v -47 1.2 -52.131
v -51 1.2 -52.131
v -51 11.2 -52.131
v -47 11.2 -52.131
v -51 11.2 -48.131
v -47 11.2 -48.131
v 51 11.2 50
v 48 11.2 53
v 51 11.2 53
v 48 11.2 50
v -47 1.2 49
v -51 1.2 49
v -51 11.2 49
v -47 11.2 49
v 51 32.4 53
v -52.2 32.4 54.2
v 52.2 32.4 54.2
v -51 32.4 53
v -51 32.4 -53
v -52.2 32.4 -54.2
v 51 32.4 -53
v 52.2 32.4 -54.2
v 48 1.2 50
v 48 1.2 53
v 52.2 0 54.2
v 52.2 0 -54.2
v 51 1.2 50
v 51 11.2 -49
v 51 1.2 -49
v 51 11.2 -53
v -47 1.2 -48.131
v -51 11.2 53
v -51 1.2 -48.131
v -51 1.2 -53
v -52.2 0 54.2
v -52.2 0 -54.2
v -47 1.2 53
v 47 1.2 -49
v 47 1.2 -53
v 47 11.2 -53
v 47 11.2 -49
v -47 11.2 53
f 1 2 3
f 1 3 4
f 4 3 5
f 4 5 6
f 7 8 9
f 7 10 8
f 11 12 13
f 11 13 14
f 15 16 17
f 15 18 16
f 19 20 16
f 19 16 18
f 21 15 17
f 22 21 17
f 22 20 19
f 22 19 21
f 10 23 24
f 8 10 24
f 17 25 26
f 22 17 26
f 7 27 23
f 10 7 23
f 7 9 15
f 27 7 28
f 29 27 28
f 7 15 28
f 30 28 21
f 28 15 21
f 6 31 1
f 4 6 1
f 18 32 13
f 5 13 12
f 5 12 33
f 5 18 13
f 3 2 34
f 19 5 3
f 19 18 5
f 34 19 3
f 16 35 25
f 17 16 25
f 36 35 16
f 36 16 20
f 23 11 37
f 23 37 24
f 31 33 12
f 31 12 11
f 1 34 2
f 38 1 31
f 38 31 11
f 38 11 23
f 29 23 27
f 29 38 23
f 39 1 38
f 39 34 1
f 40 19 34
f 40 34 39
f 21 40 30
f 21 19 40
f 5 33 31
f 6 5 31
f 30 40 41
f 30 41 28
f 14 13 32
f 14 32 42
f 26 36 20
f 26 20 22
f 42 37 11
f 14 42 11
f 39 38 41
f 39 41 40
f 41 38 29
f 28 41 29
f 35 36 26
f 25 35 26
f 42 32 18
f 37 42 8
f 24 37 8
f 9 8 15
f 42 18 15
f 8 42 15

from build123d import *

# Parameters (mm, degrees)
SKETCH_1_W          = 104.4
SKETCH_1_H          = 108.4
EXTRUDE_1_DEPTH     = 32.4
SKETCH_2_W          = 102
SKETCH_2_H          = 106
CUT_EXTRUDE_1_DEPTH = 31.2
EXTRUDE_2_DEPTH     = 10
SKETCH_6_W          = 4
SKETCH_6_H          = 4
EXTRUDE_3_DEPTH     = 10
SKETCH_7_W          = 4
SKETCH_7_H          = 4
EXTRUDE_4_DEPTH     = 10
SKETCH_10_W         = 4
SKETCH_10_H         = 4
EXTRUDE_5_DEPTH     = 10


with BuildPart() as part:
    # 草图1 → 凸台-拉伸1 (new body)
    with BuildSketch(Plane(origin=(0, 0, 0), x_dir=(1, 0, 0), z_dir=(0, 1, 0))):
        Rectangle(SKETCH_1_W, SKETCH_1_H)
    extrude(amount=EXTRUDE_1_DEPTH)

    # 草图2 → 切除-拉伸1 (cut)
    with BuildSketch(Plane(origin=(0, 32.4, 0), x_dir=(1, 0, 0), z_dir=(0, 1, 0))):
        Rectangle(SKETCH_2_W, SKETCH_2_H)
    extrude(amount=-CUT_EXTRUDE_1_DEPTH, mode=Mode.SUBTRACT)

    # 草图3 → 凸台-拉伸2 (add)
    with BuildSketch(Plane(origin=(0, 1.2, 0), x_dir=(1, 0, 0), z_dir=(0, 1, 0))):
        Polygon((48, -53), (51, -53), (51, -52.54057914), (51, -50), (48, -50), align=None)
    extrude(amount=EXTRUDE_2_DEPTH)

    # 草图6 → 凸台-拉伸3 (add)
    with BuildSketch(Plane(origin=(0, 1.2, 0), x_dir=(1, 0, 0), z_dir=(0, 1, 0))):
        with Locations((49, 51)):
            Rectangle(SKETCH_6_W, SKETCH_6_H)
    extrude(amount=EXTRUDE_3_DEPTH)

    # 草图7 → 凸台-拉伸4 (add)
    with BuildSketch(Plane(origin=(0, 1.2, 0), x_dir=(1, 0, 0), z_dir=(0, 1, 0))):
        with Locations((-49, -51)):
            Rectangle(SKETCH_7_W, SKETCH_7_H)
    extrude(amount=EXTRUDE_4_DEPTH)

    # 草图10 → 凸台-拉伸5 (add)
    with BuildSketch(Plane(origin=(0, 1.2, 0), x_dir=(1, 0, 0), z_dir=(0, 1, 0))):
        with Locations((-49, 50.130572063)):
            Rectangle(SKETCH_10_W, SKETCH_10_H)
    extrude(amount=EXTRUDE_5_DEPTH)


solid = part.part
